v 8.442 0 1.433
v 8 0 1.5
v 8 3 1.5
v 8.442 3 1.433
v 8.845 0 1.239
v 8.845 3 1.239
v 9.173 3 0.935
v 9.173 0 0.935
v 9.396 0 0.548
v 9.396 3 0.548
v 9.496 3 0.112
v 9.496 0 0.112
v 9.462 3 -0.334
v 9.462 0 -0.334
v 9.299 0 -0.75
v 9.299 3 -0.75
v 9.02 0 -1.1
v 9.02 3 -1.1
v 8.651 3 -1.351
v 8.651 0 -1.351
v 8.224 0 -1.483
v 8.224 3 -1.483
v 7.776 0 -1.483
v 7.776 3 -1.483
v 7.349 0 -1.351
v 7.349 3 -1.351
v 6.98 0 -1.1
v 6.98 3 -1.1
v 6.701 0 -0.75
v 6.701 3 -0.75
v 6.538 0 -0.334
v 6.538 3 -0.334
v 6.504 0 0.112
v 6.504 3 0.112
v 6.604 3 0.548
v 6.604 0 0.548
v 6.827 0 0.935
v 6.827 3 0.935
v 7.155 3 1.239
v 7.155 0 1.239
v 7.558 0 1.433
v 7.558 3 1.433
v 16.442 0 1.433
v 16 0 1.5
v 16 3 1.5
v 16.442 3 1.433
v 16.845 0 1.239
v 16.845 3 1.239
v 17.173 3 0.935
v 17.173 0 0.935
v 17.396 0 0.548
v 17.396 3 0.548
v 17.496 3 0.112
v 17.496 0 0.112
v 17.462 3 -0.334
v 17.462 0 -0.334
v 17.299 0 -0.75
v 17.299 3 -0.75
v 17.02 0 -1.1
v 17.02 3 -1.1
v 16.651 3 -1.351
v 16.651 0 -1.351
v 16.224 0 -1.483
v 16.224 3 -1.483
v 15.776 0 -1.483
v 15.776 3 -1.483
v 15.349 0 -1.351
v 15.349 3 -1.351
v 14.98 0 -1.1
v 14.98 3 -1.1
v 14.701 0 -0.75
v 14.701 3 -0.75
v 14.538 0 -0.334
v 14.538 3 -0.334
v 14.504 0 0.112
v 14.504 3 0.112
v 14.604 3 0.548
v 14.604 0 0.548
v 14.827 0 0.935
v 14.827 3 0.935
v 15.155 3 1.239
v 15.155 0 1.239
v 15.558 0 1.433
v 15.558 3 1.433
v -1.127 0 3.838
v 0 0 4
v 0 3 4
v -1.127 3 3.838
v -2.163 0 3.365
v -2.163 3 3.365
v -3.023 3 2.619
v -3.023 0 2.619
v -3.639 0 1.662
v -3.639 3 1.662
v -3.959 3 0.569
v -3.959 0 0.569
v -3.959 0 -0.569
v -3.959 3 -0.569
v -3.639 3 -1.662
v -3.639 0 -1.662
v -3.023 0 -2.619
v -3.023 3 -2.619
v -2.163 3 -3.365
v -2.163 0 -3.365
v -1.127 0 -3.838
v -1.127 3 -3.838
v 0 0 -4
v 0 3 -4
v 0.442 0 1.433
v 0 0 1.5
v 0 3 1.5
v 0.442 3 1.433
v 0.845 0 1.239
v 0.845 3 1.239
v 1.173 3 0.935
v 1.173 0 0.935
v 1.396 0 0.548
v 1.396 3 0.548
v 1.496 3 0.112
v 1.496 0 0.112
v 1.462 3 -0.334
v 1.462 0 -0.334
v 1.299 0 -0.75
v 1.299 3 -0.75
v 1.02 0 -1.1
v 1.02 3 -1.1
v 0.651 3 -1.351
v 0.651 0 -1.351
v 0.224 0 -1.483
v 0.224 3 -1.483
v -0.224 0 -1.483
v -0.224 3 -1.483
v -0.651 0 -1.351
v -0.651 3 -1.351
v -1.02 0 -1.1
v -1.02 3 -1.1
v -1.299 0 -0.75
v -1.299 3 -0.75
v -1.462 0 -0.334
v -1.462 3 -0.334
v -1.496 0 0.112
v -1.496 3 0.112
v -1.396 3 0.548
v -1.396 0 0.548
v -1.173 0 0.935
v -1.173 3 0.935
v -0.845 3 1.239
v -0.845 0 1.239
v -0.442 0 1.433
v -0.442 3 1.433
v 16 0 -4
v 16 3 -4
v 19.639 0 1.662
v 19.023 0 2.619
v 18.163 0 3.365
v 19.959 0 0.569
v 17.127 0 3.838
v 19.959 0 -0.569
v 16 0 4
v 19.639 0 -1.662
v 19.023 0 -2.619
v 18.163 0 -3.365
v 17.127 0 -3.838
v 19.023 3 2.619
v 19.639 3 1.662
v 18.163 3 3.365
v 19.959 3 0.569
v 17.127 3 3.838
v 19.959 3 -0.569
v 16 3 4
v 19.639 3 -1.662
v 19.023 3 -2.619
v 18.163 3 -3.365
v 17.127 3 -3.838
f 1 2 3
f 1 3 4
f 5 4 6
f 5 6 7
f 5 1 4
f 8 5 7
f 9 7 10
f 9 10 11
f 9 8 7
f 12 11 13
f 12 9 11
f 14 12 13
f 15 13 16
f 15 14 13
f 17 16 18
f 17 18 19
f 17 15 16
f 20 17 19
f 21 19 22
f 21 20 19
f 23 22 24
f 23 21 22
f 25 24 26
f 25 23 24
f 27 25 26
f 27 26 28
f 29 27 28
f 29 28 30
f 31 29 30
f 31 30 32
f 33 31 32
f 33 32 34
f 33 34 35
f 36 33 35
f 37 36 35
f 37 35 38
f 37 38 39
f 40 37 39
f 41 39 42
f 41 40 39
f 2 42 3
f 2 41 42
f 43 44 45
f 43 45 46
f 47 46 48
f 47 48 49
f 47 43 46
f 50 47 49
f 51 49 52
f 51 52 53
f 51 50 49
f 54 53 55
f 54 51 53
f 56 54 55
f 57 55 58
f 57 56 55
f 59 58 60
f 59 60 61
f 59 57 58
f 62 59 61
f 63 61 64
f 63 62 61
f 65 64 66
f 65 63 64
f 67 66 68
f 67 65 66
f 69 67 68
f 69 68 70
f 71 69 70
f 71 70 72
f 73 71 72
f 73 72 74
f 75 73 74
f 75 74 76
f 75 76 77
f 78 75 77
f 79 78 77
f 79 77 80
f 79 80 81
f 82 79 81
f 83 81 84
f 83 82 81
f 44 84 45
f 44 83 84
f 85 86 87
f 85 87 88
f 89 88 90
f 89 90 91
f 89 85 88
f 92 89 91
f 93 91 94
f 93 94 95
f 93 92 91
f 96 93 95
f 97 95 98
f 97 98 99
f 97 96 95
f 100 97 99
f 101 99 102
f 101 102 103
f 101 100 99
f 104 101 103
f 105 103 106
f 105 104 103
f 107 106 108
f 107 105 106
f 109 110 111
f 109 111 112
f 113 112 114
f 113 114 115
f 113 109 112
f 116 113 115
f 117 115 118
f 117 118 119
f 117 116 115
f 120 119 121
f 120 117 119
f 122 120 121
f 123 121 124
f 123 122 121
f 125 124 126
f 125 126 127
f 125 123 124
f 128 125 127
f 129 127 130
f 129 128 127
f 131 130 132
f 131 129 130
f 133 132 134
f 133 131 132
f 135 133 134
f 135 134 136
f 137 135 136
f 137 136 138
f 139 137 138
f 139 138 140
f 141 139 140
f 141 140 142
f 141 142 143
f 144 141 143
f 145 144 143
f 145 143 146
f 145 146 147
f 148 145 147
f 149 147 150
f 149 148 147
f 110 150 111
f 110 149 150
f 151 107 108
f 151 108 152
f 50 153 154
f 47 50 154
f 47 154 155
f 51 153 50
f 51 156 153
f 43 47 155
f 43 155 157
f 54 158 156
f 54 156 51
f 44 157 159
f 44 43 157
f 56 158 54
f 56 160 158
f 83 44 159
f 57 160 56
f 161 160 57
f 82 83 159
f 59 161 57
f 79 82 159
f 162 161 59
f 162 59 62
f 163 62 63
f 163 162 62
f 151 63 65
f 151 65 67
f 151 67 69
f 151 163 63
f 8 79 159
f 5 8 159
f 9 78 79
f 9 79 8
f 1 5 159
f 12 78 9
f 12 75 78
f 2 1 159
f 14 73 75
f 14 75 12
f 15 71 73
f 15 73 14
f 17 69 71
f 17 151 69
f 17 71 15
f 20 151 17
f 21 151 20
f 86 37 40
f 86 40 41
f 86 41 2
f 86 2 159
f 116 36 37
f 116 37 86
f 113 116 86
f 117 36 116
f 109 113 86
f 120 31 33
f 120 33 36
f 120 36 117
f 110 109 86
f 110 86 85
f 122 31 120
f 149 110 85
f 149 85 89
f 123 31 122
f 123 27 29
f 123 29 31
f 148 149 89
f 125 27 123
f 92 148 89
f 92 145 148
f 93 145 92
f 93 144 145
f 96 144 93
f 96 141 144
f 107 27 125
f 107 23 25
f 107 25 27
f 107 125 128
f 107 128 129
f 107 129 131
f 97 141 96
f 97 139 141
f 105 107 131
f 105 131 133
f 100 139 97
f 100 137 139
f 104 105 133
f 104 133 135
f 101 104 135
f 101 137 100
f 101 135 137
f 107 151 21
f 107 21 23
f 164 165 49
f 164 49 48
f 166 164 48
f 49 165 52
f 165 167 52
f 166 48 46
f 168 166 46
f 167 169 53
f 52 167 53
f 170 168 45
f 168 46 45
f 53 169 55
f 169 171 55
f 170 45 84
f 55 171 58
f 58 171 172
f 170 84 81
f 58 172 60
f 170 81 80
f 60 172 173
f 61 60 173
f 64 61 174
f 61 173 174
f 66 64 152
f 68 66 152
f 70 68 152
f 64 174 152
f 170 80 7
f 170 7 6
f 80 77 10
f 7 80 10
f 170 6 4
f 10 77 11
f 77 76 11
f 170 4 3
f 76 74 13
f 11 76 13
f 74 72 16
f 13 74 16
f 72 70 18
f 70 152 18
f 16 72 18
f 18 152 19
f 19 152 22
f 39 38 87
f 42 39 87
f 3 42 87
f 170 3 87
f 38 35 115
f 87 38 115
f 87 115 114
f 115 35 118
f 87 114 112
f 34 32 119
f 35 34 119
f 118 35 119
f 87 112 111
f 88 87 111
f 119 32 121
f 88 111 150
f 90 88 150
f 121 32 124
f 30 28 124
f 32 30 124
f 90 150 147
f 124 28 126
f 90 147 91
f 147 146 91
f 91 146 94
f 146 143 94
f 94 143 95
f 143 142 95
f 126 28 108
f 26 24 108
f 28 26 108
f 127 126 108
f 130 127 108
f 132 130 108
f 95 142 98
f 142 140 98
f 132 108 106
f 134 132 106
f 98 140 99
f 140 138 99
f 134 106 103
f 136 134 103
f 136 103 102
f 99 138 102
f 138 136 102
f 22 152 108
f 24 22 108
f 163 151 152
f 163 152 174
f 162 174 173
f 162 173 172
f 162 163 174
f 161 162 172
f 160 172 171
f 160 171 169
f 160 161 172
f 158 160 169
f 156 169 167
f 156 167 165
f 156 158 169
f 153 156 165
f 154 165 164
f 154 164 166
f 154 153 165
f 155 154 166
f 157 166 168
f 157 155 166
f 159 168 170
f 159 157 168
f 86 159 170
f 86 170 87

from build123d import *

# Parameters (mm, degrees)
SKETCH2_R             = 1.5
BOSS_EXTRUDE2_DEPTH   = 3
BOSS_EXTRUDE2_2_DEPTH = 3
BOSS_EXTRUDE2_3_DEPTH = 3
BOSS_EXTRUDE2_4_DEPTH = 3
BOSS_EXTRUDE2_5_DEPTH = 3
BOSS_EXTRUDE2_6_DEPTH = 3
BOSS_EXTRUDE2_7_DEPTH = 3
BOSS_EXTRUDE2_8_DEPTH = 3
BOSS_EXTRUDE2_9_DEPTH = 3
SKETCH3_W             = 64.685996336
SKETCH3_H             = 8.346580173
CUT_EXTRUDE1_DEPTH    = 10


with BuildPart() as part:
    # Sketch2 → Boss-Extrude2 (new body)
    with BuildSketch(Plane(origin=(0, 0, 0), x_dir=(1, 0, 0), z_dir=(0, 1, 0))):
        with Locations(Location((24, 0, 0), (0, 0, 270))):
            Circle(SKETCH2_R)
    extrude(amount=BOSS_EXTRUDE2_DEPTH)


with BuildPart() as body_2:
    # Sketch2 → Boss-Extrude2 2 (new body)
    with BuildSketch(Plane(origin=(0, 0, 0), x_dir=(1, 0, 0), z_dir=(0, 1, 0))):
        with Locations(Location((32, 0, 0), (0, 0, 270))):
            Circle(SKETCH2_R)
    extrude(amount=BOSS_EXTRUDE2_2_DEPTH)


with BuildPart() as body_3:
    # Sketch2 → Boss-Extrude2 3 (new body)
    with BuildSketch(Plane(origin=(0, 0, 0), x_dir=(1, 0, 0), z_dir=(0, 1, 0))):
        with Locations(Location((40, 0, 0), (0, 0, 270))):
            Circle(SKETCH2_R)
    extrude(amount=BOSS_EXTRUDE2_3_DEPTH)


with BuildPart() as body_4:
    # Sketch2 → Boss-Extrude2 4 (new body)
    with BuildSketch(Plane(origin=(0, 0, 0), x_dir=(1, 0, 0), z_dir=(0, 1, 0))):
        with Locations(Location((48, 0, 0), (0, 0, 270))):
            Circle(SKETCH2_R)
    extrude(amount=BOSS_EXTRUDE2_4_DEPTH)


with BuildPart() as body_5:
    # Sketch2 → Boss-Extrude2 5 (new body)
    with BuildSketch(Plane(origin=(0, 0, 0), x_dir=(1, 0, 0), z_dir=(0, 1, 0))):
        with Locations(Location((56, 0, 0), (0, 0, 270))):
            Circle(SKETCH2_R)
    extrude(amount=BOSS_EXTRUDE2_5_DEPTH)


with BuildPart() as body_6:
    # Sketch2 → Boss-Extrude2 6 (new body)
    with BuildSketch(Plane(origin=(0, 0, 0), x_dir=(1, 0, 0), z_dir=(0, 1, 0))):
        with Locations(Location((64, 0, 0), (0, 0, 270))):
            Circle(SKETCH2_R)
    extrude(amount=BOSS_EXTRUDE2_6_DEPTH)


with BuildPart() as body_7:
    # Sketch2 → Boss-Extrude2 7 (new body)
    with BuildSketch(Plane(origin=(0, 0, 0), x_dir=(1, 0, 0), z_dir=(0, 1, 0))):
        with Locations(Location((72, 0, 0), (0, 0, 270))):
            Circle(SKETCH2_R)
    extrude(amount=BOSS_EXTRUDE2_7_DEPTH)


with BuildPart() as body_8:
    # Sketch2 → Boss-Extrude2 8 (new body)
    with BuildSketch(Plane(origin=(0, 0, 0), x_dir=(1, 0, 0), z_dir=(0, 1, 0))):
        with Locations(Location((80, 0, 0), (0, 0, 270))):
            Circle(SKETCH2_R)
    extrude(amount=BOSS_EXTRUDE2_8_DEPTH)


with BuildPart() as body_9:
    # Sketch2 → Boss-Extrude2 9 (new body)
    with BuildSketch(Plane(origin=(0, 0, 0), x_dir=(1, 0, 0), z_dir=(0, 1, 0))):
        with BuildLine():
            Line((0, 4), (16, 4))
            ThreePointArc((16, 4), (20, 0), (16, -4))
            Line((16, -4), (0, -4))
            ThreePointArc((0, -4), (-4, 0), (0, 4))
        make_face()
        with Locations(Location((0, 0, 0), (0, 0, 270))):
            Circle(SKETCH2_R, mode=Mode.SUBTRACT)
        with Locations(Location((8, 0, 0), (0, 0, 270))):
            Circle(SKETCH2_R, mode=Mode.SUBTRACT)
        with Locations(Location((16, 0, 0), (0, 0, 270))):
            Circle(SKETCH2_R, mode=Mode.SUBTRACT)
    extrude(amount=BOSS_EXTRUDE2_9_DEPTH)


with BuildPart() as cut_extrude1_tool:
    # Sketch3 → Cut-Extrude1 (new body)
    with BuildSketch(Plane.XZ):
        with Locations((54.20188262, -0.75152397)):
            Rectangle(SKETCH3_W, SKETCH3_H)
    extrude(amount=-CUT_EXTRUDE1_DEPTH)


with BuildPart() as part_1:
    add(part.part)

    # Cut-Extrude1: cut by cut_extrude1_tool
    add(cut_extrude1_tool.part, mode=Mode.SUBTRACT)


with BuildPart() as body_2_1:
    add(body_2.part)

    # Cut-Extrude1: cut by cut_extrude1_tool
    add(cut_extrude1_tool.part, mode=Mode.SUBTRACT)


with BuildPart() as body_3_1:
    add(body_3.part)

    # Cut-Extrude1: cut by cut_extrude1_tool
    add(cut_extrude1_tool.part, mode=Mode.SUBTRACT)


with BuildPart() as body_4_1:
    add(body_4.part)

    # Cut-Extrude1: cut by cut_extrude1_tool
    add(cut_extrude1_tool.part, mode=Mode.SUBTRACT)


with BuildPart() as body_5_1:
    add(body_5.part)

    # Cut-Extrude1: cut by cut_extrude1_tool
    add(cut_extrude1_tool.part, mode=Mode.SUBTRACT)


with BuildPart() as body_6_1:
    add(body_6.part)

    # Cut-Extrude1: cut by cut_extrude1_tool
    add(cut_extrude1_tool.part, mode=Mode.SUBTRACT)


with BuildPart() as body_7_1:
    add(body_7.part)

    # Cut-Extrude1: cut by cut_extrude1_tool
    add(cut_extrude1_tool.part, mode=Mode.SUBTRACT)


with BuildPart() as body_8_1:
    add(body_8.part)

    # Cut-Extrude1: cut by cut_extrude1_tool
    add(cut_extrude1_tool.part, mode=Mode.SUBTRACT)


solid = body_9.part
